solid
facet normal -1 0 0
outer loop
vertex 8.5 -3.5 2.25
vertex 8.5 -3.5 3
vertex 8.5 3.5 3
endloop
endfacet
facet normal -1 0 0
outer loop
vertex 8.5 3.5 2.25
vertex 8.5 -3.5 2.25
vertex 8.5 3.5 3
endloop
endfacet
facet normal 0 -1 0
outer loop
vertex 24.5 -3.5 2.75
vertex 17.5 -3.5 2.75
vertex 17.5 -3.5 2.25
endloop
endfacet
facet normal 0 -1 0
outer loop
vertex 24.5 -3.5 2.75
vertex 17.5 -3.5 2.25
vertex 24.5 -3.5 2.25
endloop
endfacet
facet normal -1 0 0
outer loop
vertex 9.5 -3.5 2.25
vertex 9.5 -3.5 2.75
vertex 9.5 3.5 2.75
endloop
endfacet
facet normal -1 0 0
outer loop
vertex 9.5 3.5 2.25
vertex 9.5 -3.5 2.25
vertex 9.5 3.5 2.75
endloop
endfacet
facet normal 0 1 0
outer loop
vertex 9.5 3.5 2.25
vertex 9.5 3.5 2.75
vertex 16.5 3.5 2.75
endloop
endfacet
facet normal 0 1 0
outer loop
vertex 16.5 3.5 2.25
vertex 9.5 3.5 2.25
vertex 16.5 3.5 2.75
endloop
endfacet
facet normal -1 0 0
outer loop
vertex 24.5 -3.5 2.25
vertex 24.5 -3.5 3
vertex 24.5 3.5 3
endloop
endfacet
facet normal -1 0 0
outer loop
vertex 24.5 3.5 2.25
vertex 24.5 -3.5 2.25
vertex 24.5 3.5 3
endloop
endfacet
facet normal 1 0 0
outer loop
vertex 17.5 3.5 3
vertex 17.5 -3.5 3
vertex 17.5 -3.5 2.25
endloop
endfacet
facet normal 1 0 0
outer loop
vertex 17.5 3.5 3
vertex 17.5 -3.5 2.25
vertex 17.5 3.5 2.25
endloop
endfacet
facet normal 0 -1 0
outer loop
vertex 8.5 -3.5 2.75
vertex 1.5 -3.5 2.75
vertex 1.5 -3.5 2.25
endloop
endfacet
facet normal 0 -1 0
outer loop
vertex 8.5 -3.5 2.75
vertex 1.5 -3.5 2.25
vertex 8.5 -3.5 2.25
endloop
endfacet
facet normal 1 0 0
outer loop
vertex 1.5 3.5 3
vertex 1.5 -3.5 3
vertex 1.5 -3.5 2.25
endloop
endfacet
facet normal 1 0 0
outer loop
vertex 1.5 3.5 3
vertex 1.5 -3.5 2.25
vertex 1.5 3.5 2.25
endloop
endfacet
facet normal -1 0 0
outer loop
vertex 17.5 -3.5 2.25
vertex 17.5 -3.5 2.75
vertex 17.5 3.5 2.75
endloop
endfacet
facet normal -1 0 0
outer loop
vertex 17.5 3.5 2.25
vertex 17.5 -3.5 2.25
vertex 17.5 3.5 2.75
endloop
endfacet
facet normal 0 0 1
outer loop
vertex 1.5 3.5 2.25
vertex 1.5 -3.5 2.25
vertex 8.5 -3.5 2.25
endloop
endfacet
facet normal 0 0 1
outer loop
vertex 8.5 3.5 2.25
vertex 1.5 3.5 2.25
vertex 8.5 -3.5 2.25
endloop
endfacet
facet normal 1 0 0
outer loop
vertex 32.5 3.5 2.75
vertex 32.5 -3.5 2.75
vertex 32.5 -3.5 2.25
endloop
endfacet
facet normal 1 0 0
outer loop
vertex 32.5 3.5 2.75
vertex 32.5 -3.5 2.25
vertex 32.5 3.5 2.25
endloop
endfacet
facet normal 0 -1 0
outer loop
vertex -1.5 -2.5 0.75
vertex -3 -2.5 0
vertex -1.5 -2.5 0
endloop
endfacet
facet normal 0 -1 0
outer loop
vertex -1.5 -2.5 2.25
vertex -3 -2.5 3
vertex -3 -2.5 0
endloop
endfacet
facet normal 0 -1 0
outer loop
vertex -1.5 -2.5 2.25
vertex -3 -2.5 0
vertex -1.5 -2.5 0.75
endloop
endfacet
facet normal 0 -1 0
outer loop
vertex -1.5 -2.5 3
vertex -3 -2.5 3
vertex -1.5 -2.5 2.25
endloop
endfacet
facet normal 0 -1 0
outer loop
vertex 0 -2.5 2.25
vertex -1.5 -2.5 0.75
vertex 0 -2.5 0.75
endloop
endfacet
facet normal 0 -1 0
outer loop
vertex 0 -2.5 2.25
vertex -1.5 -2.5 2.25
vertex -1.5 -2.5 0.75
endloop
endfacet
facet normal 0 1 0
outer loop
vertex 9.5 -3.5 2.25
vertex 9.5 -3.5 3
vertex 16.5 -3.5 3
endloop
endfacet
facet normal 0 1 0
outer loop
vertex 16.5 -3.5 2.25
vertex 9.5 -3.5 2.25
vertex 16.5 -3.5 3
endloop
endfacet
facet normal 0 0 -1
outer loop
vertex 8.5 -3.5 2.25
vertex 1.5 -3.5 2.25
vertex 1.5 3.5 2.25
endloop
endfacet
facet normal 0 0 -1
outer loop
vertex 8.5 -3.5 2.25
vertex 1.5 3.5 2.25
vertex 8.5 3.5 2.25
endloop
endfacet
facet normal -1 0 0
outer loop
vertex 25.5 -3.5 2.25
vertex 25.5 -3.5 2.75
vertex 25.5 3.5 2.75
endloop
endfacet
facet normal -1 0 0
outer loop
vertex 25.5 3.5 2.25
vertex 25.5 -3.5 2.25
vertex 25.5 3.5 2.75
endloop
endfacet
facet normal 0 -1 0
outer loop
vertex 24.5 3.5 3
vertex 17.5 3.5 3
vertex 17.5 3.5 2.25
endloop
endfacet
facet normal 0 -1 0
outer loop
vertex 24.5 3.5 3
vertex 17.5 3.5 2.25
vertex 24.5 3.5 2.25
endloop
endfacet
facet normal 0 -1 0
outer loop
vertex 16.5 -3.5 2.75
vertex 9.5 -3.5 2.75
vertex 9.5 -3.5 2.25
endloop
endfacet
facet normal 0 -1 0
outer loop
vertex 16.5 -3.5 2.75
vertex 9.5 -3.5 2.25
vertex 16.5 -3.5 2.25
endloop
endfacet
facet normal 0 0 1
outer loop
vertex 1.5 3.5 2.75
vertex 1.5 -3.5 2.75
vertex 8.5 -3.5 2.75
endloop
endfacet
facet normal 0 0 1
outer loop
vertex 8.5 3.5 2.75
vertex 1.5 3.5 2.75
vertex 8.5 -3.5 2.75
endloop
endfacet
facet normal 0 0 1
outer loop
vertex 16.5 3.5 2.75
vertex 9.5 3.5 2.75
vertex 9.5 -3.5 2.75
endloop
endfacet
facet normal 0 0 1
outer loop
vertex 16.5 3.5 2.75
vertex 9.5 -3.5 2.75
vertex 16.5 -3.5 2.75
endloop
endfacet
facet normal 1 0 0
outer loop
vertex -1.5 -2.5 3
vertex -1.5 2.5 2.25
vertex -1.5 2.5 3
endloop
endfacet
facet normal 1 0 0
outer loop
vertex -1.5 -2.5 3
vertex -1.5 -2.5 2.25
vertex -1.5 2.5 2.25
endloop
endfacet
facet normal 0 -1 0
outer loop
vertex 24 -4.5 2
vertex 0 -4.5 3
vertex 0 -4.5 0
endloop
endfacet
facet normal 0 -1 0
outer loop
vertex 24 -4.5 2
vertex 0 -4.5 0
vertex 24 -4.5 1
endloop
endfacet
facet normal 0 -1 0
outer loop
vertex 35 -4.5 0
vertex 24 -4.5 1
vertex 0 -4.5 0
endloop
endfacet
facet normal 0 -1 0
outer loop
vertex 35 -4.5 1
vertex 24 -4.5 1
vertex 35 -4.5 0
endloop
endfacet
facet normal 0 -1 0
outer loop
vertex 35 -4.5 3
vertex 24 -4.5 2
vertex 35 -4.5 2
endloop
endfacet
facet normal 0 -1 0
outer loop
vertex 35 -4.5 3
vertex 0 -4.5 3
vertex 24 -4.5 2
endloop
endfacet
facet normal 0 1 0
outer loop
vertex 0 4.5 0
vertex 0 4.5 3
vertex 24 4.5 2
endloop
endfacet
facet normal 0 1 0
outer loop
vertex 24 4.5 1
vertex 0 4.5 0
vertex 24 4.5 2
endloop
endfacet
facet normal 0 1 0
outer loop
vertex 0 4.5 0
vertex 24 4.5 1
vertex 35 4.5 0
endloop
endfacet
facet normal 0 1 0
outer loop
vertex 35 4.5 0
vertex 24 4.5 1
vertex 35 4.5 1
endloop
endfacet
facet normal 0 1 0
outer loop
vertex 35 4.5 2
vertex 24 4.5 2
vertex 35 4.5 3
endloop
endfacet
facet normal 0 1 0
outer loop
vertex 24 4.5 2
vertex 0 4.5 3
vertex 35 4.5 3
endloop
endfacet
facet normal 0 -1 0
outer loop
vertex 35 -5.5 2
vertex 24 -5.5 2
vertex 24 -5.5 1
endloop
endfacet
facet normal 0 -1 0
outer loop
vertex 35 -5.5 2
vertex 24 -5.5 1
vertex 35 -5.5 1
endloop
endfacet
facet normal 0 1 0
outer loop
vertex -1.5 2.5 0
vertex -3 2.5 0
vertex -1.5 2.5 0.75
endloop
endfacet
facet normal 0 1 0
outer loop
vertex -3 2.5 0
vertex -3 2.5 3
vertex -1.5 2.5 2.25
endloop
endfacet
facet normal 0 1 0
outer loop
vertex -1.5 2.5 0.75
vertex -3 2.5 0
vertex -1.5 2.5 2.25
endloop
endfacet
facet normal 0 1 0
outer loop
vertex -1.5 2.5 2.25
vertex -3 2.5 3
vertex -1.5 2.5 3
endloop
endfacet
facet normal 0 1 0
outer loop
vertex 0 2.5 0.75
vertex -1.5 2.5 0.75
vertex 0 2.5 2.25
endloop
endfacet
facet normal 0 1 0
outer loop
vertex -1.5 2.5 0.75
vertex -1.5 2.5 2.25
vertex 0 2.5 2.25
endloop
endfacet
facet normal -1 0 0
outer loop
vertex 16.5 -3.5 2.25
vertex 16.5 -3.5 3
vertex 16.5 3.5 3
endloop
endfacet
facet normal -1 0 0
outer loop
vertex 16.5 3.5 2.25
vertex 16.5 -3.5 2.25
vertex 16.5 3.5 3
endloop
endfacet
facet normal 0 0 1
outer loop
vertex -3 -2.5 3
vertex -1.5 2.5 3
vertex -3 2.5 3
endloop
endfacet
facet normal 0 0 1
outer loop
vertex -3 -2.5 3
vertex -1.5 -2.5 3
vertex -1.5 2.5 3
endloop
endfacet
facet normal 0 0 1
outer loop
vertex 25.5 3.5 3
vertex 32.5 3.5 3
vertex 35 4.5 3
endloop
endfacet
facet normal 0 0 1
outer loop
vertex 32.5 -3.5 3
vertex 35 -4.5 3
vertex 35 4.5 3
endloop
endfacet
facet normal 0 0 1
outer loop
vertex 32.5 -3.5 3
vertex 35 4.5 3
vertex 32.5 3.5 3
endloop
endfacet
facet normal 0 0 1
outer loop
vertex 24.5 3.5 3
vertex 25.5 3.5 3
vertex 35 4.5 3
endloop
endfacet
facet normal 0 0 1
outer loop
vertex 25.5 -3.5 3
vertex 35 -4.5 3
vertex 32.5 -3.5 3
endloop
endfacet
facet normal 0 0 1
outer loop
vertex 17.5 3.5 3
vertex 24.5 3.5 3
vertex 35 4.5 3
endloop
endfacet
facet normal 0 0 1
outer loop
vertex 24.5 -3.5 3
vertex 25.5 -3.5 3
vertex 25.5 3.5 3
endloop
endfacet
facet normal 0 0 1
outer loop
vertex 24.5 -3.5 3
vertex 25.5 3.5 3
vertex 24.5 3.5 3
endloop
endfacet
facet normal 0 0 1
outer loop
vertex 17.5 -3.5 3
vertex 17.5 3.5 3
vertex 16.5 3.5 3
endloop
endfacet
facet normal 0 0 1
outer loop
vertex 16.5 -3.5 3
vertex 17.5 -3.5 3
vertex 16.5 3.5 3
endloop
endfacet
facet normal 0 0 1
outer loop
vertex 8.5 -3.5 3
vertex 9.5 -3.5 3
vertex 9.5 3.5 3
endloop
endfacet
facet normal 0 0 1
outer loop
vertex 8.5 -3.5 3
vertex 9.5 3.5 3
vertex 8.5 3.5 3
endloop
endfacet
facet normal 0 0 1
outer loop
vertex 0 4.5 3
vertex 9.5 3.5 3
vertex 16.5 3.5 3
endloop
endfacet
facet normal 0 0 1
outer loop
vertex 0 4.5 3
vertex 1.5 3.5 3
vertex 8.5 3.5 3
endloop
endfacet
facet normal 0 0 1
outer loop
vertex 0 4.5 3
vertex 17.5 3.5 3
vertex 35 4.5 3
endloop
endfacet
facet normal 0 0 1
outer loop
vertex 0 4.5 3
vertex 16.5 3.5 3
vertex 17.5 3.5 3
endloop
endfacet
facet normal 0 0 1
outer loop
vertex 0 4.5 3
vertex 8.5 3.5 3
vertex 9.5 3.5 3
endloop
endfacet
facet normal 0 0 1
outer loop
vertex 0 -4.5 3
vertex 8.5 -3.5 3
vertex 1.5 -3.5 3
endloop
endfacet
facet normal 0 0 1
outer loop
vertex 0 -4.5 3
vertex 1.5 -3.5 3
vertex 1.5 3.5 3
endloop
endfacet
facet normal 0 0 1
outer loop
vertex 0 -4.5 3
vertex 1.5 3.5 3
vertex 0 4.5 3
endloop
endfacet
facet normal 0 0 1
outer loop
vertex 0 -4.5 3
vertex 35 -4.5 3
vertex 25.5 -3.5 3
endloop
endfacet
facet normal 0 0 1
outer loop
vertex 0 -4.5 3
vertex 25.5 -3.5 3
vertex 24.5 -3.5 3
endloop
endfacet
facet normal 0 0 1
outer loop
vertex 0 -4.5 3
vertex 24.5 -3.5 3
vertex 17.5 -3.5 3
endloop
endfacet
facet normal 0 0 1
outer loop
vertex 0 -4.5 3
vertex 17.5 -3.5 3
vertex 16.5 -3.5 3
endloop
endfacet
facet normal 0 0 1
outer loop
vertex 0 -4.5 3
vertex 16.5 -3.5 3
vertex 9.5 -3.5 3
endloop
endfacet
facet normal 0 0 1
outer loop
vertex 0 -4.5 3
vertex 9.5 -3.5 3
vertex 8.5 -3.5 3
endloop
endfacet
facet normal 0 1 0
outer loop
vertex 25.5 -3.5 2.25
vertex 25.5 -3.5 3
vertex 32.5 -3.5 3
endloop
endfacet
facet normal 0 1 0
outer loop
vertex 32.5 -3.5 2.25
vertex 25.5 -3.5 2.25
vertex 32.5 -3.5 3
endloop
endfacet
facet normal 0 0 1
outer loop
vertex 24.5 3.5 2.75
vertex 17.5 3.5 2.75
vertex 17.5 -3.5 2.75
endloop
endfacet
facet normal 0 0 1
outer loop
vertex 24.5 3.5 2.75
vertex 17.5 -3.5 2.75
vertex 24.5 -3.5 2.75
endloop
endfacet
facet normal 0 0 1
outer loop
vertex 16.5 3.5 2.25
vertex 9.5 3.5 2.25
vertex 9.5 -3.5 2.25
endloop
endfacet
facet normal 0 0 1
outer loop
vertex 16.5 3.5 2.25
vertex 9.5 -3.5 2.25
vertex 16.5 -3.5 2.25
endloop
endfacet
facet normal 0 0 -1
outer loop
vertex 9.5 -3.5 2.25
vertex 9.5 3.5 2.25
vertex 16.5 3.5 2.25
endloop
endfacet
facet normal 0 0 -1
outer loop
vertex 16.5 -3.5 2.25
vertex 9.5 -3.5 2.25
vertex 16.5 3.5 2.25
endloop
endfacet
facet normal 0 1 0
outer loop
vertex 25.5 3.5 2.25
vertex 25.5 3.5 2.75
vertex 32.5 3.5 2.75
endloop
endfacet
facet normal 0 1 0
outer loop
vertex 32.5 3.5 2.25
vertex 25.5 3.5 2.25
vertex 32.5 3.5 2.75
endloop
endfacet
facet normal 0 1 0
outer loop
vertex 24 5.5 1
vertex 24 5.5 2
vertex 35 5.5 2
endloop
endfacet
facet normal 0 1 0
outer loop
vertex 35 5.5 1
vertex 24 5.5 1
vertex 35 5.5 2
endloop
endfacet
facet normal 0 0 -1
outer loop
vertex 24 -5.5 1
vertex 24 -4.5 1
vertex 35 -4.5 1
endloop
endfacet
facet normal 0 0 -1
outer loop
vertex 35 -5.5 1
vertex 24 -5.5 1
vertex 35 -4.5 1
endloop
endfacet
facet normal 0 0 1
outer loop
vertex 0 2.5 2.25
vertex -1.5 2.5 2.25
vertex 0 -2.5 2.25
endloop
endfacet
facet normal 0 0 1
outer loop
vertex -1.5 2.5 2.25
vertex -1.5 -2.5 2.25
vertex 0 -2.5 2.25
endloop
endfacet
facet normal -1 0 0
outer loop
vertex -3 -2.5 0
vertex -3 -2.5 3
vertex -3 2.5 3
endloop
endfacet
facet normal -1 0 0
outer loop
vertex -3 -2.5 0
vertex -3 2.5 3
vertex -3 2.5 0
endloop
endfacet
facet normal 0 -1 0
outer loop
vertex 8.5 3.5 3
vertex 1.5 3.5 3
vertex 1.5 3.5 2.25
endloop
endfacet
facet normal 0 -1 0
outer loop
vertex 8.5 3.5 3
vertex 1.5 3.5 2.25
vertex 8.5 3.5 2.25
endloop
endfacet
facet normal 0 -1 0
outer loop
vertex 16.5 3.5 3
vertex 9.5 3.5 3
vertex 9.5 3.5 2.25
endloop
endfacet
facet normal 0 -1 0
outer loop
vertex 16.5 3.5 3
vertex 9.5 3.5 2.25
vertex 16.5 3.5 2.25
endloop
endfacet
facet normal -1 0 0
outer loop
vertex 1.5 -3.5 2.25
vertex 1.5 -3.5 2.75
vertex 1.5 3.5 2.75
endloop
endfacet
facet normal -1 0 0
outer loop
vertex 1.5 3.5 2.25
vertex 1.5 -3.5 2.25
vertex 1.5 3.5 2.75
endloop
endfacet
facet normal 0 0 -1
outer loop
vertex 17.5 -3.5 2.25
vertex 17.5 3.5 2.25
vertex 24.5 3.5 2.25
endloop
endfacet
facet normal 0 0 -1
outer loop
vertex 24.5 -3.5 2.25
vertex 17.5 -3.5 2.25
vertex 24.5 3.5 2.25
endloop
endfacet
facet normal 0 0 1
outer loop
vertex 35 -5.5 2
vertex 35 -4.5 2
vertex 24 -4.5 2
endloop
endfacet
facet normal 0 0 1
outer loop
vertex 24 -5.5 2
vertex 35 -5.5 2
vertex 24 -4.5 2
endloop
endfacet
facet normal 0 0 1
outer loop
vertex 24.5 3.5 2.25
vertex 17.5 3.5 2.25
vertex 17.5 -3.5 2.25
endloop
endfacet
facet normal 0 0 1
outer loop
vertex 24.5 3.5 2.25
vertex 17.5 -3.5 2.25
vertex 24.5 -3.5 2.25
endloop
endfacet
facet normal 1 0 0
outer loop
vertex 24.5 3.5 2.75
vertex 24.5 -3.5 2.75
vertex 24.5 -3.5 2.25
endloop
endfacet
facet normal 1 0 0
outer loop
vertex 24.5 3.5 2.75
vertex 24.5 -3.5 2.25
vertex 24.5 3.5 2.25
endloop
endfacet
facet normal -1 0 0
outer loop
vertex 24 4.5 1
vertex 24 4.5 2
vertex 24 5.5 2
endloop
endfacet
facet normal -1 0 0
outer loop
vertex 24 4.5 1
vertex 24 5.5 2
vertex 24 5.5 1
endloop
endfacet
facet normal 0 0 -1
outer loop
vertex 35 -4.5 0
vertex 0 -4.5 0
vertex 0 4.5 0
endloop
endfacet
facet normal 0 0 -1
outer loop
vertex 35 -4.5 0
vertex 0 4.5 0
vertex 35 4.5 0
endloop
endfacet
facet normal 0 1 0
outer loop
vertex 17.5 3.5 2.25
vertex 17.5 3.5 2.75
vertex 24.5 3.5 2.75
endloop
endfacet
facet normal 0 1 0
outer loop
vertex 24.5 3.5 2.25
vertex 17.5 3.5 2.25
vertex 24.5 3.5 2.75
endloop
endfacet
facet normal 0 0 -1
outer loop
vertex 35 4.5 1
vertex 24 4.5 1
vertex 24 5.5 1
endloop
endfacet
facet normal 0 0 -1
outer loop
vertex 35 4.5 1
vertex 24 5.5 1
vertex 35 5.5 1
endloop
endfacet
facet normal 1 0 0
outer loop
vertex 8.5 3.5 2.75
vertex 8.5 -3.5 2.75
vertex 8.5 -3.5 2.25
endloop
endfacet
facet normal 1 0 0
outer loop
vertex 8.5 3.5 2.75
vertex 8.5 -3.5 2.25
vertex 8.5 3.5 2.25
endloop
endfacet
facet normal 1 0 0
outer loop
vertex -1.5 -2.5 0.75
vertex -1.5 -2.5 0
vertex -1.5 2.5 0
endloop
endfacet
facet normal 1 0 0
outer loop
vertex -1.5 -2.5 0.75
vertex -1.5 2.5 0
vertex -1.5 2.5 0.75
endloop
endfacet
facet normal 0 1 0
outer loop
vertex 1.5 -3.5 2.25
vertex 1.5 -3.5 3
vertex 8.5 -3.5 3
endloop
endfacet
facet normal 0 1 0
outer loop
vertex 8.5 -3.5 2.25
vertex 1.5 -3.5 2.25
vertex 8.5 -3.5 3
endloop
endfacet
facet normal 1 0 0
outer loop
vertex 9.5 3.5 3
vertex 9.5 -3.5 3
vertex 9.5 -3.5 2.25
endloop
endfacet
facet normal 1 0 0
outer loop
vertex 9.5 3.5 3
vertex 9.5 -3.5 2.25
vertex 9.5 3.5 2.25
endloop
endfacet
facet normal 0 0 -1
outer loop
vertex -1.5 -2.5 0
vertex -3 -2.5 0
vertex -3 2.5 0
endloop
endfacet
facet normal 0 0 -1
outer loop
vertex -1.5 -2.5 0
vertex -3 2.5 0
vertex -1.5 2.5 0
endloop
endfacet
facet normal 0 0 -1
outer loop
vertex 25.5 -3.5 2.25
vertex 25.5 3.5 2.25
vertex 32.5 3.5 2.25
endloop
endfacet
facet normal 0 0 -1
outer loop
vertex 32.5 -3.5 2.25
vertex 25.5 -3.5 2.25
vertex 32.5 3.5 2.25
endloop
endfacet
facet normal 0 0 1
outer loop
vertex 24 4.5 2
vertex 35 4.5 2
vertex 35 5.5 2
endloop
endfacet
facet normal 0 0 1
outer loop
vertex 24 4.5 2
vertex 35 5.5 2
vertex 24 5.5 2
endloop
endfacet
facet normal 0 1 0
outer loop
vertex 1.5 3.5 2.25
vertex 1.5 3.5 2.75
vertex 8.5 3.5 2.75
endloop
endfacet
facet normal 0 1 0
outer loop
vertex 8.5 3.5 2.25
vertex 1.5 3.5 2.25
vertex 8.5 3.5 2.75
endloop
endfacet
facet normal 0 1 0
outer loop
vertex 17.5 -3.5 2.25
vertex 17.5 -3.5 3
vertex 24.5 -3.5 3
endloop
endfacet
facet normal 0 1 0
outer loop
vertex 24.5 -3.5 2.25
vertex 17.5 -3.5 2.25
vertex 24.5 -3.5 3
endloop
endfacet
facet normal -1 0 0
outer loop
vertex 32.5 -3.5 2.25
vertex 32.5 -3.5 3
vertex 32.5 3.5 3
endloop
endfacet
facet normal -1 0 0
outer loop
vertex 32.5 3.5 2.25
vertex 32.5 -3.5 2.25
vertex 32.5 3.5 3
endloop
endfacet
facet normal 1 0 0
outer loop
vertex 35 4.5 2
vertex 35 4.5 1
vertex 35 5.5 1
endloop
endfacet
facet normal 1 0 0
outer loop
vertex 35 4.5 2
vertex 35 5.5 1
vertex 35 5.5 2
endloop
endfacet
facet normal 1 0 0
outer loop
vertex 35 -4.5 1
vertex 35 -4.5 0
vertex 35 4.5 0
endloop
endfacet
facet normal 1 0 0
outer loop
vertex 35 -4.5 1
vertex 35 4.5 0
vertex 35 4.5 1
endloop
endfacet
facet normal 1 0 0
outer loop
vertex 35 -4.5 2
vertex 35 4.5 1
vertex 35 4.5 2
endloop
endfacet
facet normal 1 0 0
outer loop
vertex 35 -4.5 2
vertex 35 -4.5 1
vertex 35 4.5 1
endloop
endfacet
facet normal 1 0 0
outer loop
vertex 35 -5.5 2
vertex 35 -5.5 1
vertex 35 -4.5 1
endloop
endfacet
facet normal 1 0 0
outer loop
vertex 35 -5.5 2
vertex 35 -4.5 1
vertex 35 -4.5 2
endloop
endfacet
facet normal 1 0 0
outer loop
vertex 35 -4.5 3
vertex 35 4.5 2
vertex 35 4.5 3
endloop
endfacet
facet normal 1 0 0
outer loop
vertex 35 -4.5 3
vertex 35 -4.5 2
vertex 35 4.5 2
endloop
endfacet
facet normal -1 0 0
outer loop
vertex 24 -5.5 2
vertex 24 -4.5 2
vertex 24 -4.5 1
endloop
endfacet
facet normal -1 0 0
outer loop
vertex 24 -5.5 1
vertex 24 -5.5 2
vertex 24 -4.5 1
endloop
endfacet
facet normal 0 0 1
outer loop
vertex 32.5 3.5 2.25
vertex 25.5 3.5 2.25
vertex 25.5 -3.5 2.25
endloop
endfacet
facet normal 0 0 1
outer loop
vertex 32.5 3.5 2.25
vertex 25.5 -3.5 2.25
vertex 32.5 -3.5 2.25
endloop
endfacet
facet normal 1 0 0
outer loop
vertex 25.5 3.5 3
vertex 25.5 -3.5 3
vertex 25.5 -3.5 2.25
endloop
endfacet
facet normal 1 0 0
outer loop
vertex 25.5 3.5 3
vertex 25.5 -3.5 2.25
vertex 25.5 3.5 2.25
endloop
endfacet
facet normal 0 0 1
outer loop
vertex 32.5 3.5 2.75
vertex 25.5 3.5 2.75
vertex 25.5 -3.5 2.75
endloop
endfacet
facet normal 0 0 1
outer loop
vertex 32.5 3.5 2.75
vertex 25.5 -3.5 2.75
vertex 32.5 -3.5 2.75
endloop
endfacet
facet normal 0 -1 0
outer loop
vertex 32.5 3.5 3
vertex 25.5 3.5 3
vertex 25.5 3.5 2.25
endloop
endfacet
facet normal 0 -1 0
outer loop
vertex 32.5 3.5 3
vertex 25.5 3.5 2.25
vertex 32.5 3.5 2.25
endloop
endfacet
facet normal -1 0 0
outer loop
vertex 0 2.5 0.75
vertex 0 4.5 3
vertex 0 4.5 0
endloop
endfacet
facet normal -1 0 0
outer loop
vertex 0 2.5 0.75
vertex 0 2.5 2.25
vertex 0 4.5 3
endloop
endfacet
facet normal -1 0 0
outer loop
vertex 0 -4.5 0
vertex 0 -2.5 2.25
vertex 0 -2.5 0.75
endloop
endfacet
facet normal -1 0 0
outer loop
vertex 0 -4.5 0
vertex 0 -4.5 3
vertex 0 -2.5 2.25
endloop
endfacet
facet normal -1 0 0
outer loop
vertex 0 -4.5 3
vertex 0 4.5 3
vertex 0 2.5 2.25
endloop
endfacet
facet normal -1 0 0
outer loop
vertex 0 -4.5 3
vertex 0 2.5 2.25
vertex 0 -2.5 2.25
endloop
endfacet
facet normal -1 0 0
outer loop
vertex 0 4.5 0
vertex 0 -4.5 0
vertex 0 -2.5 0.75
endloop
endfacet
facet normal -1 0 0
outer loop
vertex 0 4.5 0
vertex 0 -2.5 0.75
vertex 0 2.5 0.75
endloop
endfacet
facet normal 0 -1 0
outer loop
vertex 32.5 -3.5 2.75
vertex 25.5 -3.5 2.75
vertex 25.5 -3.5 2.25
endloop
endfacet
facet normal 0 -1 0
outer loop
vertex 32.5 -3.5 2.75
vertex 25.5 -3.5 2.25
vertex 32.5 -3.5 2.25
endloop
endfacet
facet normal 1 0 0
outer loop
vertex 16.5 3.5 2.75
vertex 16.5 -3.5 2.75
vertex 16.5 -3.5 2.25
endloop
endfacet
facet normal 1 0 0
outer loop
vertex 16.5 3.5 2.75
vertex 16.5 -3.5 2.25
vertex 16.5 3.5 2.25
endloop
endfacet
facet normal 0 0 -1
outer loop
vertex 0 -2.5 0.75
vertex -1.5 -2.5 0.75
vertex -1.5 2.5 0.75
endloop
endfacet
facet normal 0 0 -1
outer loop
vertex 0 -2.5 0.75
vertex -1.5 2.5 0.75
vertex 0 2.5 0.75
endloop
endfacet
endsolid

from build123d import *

# Parameters (mm, degrees)
F1_DEPTH = 4.5
F2_W     = 7
F2_H     = 7
F3_DEPTH = 0.75
F4_DEPTH = 0.5
F6_DEPTH = 1
F0_W     = 1.5
F0_H     = 1.5
F8_DEPTH = 2.5


with BuildPart() as f1:
    # F0 (on Front) → F1 (new body, symmetric)
    with BuildSketch(Plane.XZ):
        Polygon((35, 3), (0, 3), (0, 2.25), (0, 0.75), (0, 0), (35, 0), align=None)
    extrude(amount=F1_DEPTH, both=True)

    # F2 (on face) → F3 (cut)
    with BuildSketch(Plane.XY.offset(3)):
        with Locations((29, 0)):
            Rectangle(F2_W, F2_H)
        with Locations((21, 0)):
            Rectangle(F2_W, F2_H)
        with Locations((13, 0)):
            Rectangle(F2_W, F2_H)
        with Locations((5, 0)):
            Rectangle(F2_W, F2_H)
    extrude(amount=-F3_DEPTH, mode=Mode.SUBTRACT)

    # F5 (on face) → F6 (join)
    with BuildSketch(Plane.XZ.offset(4.5)):
        Polygon((35, 1), (35, 2), (34, 2), (24, 2), (24, 1), (34, 1), align=None)
    extrude(amount=F6_DEPTH)


with BuildPart() as f4:
    # F2 (on face) → F4 (new body)
    with BuildSketch(Plane.XY.offset(3)):
        with Locations((5, 0)):
            Rectangle(F2_W, F2_H)
    extrude(amount=-F4_DEPTH)


with BuildPart() as f4b:
    # F2 (on face) → F4, piece 2 (new body)
    with BuildSketch(Plane.XY.offset(3)):
        with Locations((13, 0)):
            Rectangle(F2_W, F2_H)
    extrude(amount=-F4_DEPTH)


with BuildPart() as f4c:
    # F2 (on face) → F4, piece 3 (new body)
    with BuildSketch(Plane.XY.offset(3)):
        with Locations((21, 0)):
            Rectangle(F2_W, F2_H)
    extrude(amount=-F4_DEPTH)


with BuildPart() as f4d:
    # F2 (on face) → F4, piece 4 (new body)
    with BuildSketch(Plane.XY.offset(3)):
        with Locations((29, 0)):
            Rectangle(F2_W, F2_H)
    extrude(amount=-F4_DEPTH)


with BuildPart() as f7_1:
    # F7: instance of F1
    add(f1.part.mirror(Plane.XZ))


with BuildPart() as f1_1:
    add(f1.part)

    add(f7_1.part)  # F8 merges F7_1
    # F0 (on Front) → F8 (join, symmetric)
    with BuildSketch(Plane.XZ):
        Polygon((-1.5, 0.75), (-1.5, 2.25), (-1.5, 3), (-3, 3), (-3, 0), (-1.5, 0), align=None)
        with Locations((-0.75, 1.5)):
            Rectangle(F0_W, F0_H)
    extrude(amount=F8_DEPTH, both=True)


with BuildPart() as f4c_1:
    # F9: moved
    add(f4c.part.moved(Location((0, 0, -0.25))))


with BuildPart() as f4b_1:
    # F9: moved
    add(f4b.part.moved(Location((0, 0, -0.25))))


with BuildPart() as f4_1:
    # F9: moved
    add(f4.part.moved(Location((0, 0, -0.25))))


with BuildPart() as f4d_1:
    # F9: moved
    add(f4d.part.moved(Location((0, 0, -0.25))))


solid = Compound([f1_1.part, f4c_1.part, f4b_1.part, f4_1.part, f4d_1.part])
